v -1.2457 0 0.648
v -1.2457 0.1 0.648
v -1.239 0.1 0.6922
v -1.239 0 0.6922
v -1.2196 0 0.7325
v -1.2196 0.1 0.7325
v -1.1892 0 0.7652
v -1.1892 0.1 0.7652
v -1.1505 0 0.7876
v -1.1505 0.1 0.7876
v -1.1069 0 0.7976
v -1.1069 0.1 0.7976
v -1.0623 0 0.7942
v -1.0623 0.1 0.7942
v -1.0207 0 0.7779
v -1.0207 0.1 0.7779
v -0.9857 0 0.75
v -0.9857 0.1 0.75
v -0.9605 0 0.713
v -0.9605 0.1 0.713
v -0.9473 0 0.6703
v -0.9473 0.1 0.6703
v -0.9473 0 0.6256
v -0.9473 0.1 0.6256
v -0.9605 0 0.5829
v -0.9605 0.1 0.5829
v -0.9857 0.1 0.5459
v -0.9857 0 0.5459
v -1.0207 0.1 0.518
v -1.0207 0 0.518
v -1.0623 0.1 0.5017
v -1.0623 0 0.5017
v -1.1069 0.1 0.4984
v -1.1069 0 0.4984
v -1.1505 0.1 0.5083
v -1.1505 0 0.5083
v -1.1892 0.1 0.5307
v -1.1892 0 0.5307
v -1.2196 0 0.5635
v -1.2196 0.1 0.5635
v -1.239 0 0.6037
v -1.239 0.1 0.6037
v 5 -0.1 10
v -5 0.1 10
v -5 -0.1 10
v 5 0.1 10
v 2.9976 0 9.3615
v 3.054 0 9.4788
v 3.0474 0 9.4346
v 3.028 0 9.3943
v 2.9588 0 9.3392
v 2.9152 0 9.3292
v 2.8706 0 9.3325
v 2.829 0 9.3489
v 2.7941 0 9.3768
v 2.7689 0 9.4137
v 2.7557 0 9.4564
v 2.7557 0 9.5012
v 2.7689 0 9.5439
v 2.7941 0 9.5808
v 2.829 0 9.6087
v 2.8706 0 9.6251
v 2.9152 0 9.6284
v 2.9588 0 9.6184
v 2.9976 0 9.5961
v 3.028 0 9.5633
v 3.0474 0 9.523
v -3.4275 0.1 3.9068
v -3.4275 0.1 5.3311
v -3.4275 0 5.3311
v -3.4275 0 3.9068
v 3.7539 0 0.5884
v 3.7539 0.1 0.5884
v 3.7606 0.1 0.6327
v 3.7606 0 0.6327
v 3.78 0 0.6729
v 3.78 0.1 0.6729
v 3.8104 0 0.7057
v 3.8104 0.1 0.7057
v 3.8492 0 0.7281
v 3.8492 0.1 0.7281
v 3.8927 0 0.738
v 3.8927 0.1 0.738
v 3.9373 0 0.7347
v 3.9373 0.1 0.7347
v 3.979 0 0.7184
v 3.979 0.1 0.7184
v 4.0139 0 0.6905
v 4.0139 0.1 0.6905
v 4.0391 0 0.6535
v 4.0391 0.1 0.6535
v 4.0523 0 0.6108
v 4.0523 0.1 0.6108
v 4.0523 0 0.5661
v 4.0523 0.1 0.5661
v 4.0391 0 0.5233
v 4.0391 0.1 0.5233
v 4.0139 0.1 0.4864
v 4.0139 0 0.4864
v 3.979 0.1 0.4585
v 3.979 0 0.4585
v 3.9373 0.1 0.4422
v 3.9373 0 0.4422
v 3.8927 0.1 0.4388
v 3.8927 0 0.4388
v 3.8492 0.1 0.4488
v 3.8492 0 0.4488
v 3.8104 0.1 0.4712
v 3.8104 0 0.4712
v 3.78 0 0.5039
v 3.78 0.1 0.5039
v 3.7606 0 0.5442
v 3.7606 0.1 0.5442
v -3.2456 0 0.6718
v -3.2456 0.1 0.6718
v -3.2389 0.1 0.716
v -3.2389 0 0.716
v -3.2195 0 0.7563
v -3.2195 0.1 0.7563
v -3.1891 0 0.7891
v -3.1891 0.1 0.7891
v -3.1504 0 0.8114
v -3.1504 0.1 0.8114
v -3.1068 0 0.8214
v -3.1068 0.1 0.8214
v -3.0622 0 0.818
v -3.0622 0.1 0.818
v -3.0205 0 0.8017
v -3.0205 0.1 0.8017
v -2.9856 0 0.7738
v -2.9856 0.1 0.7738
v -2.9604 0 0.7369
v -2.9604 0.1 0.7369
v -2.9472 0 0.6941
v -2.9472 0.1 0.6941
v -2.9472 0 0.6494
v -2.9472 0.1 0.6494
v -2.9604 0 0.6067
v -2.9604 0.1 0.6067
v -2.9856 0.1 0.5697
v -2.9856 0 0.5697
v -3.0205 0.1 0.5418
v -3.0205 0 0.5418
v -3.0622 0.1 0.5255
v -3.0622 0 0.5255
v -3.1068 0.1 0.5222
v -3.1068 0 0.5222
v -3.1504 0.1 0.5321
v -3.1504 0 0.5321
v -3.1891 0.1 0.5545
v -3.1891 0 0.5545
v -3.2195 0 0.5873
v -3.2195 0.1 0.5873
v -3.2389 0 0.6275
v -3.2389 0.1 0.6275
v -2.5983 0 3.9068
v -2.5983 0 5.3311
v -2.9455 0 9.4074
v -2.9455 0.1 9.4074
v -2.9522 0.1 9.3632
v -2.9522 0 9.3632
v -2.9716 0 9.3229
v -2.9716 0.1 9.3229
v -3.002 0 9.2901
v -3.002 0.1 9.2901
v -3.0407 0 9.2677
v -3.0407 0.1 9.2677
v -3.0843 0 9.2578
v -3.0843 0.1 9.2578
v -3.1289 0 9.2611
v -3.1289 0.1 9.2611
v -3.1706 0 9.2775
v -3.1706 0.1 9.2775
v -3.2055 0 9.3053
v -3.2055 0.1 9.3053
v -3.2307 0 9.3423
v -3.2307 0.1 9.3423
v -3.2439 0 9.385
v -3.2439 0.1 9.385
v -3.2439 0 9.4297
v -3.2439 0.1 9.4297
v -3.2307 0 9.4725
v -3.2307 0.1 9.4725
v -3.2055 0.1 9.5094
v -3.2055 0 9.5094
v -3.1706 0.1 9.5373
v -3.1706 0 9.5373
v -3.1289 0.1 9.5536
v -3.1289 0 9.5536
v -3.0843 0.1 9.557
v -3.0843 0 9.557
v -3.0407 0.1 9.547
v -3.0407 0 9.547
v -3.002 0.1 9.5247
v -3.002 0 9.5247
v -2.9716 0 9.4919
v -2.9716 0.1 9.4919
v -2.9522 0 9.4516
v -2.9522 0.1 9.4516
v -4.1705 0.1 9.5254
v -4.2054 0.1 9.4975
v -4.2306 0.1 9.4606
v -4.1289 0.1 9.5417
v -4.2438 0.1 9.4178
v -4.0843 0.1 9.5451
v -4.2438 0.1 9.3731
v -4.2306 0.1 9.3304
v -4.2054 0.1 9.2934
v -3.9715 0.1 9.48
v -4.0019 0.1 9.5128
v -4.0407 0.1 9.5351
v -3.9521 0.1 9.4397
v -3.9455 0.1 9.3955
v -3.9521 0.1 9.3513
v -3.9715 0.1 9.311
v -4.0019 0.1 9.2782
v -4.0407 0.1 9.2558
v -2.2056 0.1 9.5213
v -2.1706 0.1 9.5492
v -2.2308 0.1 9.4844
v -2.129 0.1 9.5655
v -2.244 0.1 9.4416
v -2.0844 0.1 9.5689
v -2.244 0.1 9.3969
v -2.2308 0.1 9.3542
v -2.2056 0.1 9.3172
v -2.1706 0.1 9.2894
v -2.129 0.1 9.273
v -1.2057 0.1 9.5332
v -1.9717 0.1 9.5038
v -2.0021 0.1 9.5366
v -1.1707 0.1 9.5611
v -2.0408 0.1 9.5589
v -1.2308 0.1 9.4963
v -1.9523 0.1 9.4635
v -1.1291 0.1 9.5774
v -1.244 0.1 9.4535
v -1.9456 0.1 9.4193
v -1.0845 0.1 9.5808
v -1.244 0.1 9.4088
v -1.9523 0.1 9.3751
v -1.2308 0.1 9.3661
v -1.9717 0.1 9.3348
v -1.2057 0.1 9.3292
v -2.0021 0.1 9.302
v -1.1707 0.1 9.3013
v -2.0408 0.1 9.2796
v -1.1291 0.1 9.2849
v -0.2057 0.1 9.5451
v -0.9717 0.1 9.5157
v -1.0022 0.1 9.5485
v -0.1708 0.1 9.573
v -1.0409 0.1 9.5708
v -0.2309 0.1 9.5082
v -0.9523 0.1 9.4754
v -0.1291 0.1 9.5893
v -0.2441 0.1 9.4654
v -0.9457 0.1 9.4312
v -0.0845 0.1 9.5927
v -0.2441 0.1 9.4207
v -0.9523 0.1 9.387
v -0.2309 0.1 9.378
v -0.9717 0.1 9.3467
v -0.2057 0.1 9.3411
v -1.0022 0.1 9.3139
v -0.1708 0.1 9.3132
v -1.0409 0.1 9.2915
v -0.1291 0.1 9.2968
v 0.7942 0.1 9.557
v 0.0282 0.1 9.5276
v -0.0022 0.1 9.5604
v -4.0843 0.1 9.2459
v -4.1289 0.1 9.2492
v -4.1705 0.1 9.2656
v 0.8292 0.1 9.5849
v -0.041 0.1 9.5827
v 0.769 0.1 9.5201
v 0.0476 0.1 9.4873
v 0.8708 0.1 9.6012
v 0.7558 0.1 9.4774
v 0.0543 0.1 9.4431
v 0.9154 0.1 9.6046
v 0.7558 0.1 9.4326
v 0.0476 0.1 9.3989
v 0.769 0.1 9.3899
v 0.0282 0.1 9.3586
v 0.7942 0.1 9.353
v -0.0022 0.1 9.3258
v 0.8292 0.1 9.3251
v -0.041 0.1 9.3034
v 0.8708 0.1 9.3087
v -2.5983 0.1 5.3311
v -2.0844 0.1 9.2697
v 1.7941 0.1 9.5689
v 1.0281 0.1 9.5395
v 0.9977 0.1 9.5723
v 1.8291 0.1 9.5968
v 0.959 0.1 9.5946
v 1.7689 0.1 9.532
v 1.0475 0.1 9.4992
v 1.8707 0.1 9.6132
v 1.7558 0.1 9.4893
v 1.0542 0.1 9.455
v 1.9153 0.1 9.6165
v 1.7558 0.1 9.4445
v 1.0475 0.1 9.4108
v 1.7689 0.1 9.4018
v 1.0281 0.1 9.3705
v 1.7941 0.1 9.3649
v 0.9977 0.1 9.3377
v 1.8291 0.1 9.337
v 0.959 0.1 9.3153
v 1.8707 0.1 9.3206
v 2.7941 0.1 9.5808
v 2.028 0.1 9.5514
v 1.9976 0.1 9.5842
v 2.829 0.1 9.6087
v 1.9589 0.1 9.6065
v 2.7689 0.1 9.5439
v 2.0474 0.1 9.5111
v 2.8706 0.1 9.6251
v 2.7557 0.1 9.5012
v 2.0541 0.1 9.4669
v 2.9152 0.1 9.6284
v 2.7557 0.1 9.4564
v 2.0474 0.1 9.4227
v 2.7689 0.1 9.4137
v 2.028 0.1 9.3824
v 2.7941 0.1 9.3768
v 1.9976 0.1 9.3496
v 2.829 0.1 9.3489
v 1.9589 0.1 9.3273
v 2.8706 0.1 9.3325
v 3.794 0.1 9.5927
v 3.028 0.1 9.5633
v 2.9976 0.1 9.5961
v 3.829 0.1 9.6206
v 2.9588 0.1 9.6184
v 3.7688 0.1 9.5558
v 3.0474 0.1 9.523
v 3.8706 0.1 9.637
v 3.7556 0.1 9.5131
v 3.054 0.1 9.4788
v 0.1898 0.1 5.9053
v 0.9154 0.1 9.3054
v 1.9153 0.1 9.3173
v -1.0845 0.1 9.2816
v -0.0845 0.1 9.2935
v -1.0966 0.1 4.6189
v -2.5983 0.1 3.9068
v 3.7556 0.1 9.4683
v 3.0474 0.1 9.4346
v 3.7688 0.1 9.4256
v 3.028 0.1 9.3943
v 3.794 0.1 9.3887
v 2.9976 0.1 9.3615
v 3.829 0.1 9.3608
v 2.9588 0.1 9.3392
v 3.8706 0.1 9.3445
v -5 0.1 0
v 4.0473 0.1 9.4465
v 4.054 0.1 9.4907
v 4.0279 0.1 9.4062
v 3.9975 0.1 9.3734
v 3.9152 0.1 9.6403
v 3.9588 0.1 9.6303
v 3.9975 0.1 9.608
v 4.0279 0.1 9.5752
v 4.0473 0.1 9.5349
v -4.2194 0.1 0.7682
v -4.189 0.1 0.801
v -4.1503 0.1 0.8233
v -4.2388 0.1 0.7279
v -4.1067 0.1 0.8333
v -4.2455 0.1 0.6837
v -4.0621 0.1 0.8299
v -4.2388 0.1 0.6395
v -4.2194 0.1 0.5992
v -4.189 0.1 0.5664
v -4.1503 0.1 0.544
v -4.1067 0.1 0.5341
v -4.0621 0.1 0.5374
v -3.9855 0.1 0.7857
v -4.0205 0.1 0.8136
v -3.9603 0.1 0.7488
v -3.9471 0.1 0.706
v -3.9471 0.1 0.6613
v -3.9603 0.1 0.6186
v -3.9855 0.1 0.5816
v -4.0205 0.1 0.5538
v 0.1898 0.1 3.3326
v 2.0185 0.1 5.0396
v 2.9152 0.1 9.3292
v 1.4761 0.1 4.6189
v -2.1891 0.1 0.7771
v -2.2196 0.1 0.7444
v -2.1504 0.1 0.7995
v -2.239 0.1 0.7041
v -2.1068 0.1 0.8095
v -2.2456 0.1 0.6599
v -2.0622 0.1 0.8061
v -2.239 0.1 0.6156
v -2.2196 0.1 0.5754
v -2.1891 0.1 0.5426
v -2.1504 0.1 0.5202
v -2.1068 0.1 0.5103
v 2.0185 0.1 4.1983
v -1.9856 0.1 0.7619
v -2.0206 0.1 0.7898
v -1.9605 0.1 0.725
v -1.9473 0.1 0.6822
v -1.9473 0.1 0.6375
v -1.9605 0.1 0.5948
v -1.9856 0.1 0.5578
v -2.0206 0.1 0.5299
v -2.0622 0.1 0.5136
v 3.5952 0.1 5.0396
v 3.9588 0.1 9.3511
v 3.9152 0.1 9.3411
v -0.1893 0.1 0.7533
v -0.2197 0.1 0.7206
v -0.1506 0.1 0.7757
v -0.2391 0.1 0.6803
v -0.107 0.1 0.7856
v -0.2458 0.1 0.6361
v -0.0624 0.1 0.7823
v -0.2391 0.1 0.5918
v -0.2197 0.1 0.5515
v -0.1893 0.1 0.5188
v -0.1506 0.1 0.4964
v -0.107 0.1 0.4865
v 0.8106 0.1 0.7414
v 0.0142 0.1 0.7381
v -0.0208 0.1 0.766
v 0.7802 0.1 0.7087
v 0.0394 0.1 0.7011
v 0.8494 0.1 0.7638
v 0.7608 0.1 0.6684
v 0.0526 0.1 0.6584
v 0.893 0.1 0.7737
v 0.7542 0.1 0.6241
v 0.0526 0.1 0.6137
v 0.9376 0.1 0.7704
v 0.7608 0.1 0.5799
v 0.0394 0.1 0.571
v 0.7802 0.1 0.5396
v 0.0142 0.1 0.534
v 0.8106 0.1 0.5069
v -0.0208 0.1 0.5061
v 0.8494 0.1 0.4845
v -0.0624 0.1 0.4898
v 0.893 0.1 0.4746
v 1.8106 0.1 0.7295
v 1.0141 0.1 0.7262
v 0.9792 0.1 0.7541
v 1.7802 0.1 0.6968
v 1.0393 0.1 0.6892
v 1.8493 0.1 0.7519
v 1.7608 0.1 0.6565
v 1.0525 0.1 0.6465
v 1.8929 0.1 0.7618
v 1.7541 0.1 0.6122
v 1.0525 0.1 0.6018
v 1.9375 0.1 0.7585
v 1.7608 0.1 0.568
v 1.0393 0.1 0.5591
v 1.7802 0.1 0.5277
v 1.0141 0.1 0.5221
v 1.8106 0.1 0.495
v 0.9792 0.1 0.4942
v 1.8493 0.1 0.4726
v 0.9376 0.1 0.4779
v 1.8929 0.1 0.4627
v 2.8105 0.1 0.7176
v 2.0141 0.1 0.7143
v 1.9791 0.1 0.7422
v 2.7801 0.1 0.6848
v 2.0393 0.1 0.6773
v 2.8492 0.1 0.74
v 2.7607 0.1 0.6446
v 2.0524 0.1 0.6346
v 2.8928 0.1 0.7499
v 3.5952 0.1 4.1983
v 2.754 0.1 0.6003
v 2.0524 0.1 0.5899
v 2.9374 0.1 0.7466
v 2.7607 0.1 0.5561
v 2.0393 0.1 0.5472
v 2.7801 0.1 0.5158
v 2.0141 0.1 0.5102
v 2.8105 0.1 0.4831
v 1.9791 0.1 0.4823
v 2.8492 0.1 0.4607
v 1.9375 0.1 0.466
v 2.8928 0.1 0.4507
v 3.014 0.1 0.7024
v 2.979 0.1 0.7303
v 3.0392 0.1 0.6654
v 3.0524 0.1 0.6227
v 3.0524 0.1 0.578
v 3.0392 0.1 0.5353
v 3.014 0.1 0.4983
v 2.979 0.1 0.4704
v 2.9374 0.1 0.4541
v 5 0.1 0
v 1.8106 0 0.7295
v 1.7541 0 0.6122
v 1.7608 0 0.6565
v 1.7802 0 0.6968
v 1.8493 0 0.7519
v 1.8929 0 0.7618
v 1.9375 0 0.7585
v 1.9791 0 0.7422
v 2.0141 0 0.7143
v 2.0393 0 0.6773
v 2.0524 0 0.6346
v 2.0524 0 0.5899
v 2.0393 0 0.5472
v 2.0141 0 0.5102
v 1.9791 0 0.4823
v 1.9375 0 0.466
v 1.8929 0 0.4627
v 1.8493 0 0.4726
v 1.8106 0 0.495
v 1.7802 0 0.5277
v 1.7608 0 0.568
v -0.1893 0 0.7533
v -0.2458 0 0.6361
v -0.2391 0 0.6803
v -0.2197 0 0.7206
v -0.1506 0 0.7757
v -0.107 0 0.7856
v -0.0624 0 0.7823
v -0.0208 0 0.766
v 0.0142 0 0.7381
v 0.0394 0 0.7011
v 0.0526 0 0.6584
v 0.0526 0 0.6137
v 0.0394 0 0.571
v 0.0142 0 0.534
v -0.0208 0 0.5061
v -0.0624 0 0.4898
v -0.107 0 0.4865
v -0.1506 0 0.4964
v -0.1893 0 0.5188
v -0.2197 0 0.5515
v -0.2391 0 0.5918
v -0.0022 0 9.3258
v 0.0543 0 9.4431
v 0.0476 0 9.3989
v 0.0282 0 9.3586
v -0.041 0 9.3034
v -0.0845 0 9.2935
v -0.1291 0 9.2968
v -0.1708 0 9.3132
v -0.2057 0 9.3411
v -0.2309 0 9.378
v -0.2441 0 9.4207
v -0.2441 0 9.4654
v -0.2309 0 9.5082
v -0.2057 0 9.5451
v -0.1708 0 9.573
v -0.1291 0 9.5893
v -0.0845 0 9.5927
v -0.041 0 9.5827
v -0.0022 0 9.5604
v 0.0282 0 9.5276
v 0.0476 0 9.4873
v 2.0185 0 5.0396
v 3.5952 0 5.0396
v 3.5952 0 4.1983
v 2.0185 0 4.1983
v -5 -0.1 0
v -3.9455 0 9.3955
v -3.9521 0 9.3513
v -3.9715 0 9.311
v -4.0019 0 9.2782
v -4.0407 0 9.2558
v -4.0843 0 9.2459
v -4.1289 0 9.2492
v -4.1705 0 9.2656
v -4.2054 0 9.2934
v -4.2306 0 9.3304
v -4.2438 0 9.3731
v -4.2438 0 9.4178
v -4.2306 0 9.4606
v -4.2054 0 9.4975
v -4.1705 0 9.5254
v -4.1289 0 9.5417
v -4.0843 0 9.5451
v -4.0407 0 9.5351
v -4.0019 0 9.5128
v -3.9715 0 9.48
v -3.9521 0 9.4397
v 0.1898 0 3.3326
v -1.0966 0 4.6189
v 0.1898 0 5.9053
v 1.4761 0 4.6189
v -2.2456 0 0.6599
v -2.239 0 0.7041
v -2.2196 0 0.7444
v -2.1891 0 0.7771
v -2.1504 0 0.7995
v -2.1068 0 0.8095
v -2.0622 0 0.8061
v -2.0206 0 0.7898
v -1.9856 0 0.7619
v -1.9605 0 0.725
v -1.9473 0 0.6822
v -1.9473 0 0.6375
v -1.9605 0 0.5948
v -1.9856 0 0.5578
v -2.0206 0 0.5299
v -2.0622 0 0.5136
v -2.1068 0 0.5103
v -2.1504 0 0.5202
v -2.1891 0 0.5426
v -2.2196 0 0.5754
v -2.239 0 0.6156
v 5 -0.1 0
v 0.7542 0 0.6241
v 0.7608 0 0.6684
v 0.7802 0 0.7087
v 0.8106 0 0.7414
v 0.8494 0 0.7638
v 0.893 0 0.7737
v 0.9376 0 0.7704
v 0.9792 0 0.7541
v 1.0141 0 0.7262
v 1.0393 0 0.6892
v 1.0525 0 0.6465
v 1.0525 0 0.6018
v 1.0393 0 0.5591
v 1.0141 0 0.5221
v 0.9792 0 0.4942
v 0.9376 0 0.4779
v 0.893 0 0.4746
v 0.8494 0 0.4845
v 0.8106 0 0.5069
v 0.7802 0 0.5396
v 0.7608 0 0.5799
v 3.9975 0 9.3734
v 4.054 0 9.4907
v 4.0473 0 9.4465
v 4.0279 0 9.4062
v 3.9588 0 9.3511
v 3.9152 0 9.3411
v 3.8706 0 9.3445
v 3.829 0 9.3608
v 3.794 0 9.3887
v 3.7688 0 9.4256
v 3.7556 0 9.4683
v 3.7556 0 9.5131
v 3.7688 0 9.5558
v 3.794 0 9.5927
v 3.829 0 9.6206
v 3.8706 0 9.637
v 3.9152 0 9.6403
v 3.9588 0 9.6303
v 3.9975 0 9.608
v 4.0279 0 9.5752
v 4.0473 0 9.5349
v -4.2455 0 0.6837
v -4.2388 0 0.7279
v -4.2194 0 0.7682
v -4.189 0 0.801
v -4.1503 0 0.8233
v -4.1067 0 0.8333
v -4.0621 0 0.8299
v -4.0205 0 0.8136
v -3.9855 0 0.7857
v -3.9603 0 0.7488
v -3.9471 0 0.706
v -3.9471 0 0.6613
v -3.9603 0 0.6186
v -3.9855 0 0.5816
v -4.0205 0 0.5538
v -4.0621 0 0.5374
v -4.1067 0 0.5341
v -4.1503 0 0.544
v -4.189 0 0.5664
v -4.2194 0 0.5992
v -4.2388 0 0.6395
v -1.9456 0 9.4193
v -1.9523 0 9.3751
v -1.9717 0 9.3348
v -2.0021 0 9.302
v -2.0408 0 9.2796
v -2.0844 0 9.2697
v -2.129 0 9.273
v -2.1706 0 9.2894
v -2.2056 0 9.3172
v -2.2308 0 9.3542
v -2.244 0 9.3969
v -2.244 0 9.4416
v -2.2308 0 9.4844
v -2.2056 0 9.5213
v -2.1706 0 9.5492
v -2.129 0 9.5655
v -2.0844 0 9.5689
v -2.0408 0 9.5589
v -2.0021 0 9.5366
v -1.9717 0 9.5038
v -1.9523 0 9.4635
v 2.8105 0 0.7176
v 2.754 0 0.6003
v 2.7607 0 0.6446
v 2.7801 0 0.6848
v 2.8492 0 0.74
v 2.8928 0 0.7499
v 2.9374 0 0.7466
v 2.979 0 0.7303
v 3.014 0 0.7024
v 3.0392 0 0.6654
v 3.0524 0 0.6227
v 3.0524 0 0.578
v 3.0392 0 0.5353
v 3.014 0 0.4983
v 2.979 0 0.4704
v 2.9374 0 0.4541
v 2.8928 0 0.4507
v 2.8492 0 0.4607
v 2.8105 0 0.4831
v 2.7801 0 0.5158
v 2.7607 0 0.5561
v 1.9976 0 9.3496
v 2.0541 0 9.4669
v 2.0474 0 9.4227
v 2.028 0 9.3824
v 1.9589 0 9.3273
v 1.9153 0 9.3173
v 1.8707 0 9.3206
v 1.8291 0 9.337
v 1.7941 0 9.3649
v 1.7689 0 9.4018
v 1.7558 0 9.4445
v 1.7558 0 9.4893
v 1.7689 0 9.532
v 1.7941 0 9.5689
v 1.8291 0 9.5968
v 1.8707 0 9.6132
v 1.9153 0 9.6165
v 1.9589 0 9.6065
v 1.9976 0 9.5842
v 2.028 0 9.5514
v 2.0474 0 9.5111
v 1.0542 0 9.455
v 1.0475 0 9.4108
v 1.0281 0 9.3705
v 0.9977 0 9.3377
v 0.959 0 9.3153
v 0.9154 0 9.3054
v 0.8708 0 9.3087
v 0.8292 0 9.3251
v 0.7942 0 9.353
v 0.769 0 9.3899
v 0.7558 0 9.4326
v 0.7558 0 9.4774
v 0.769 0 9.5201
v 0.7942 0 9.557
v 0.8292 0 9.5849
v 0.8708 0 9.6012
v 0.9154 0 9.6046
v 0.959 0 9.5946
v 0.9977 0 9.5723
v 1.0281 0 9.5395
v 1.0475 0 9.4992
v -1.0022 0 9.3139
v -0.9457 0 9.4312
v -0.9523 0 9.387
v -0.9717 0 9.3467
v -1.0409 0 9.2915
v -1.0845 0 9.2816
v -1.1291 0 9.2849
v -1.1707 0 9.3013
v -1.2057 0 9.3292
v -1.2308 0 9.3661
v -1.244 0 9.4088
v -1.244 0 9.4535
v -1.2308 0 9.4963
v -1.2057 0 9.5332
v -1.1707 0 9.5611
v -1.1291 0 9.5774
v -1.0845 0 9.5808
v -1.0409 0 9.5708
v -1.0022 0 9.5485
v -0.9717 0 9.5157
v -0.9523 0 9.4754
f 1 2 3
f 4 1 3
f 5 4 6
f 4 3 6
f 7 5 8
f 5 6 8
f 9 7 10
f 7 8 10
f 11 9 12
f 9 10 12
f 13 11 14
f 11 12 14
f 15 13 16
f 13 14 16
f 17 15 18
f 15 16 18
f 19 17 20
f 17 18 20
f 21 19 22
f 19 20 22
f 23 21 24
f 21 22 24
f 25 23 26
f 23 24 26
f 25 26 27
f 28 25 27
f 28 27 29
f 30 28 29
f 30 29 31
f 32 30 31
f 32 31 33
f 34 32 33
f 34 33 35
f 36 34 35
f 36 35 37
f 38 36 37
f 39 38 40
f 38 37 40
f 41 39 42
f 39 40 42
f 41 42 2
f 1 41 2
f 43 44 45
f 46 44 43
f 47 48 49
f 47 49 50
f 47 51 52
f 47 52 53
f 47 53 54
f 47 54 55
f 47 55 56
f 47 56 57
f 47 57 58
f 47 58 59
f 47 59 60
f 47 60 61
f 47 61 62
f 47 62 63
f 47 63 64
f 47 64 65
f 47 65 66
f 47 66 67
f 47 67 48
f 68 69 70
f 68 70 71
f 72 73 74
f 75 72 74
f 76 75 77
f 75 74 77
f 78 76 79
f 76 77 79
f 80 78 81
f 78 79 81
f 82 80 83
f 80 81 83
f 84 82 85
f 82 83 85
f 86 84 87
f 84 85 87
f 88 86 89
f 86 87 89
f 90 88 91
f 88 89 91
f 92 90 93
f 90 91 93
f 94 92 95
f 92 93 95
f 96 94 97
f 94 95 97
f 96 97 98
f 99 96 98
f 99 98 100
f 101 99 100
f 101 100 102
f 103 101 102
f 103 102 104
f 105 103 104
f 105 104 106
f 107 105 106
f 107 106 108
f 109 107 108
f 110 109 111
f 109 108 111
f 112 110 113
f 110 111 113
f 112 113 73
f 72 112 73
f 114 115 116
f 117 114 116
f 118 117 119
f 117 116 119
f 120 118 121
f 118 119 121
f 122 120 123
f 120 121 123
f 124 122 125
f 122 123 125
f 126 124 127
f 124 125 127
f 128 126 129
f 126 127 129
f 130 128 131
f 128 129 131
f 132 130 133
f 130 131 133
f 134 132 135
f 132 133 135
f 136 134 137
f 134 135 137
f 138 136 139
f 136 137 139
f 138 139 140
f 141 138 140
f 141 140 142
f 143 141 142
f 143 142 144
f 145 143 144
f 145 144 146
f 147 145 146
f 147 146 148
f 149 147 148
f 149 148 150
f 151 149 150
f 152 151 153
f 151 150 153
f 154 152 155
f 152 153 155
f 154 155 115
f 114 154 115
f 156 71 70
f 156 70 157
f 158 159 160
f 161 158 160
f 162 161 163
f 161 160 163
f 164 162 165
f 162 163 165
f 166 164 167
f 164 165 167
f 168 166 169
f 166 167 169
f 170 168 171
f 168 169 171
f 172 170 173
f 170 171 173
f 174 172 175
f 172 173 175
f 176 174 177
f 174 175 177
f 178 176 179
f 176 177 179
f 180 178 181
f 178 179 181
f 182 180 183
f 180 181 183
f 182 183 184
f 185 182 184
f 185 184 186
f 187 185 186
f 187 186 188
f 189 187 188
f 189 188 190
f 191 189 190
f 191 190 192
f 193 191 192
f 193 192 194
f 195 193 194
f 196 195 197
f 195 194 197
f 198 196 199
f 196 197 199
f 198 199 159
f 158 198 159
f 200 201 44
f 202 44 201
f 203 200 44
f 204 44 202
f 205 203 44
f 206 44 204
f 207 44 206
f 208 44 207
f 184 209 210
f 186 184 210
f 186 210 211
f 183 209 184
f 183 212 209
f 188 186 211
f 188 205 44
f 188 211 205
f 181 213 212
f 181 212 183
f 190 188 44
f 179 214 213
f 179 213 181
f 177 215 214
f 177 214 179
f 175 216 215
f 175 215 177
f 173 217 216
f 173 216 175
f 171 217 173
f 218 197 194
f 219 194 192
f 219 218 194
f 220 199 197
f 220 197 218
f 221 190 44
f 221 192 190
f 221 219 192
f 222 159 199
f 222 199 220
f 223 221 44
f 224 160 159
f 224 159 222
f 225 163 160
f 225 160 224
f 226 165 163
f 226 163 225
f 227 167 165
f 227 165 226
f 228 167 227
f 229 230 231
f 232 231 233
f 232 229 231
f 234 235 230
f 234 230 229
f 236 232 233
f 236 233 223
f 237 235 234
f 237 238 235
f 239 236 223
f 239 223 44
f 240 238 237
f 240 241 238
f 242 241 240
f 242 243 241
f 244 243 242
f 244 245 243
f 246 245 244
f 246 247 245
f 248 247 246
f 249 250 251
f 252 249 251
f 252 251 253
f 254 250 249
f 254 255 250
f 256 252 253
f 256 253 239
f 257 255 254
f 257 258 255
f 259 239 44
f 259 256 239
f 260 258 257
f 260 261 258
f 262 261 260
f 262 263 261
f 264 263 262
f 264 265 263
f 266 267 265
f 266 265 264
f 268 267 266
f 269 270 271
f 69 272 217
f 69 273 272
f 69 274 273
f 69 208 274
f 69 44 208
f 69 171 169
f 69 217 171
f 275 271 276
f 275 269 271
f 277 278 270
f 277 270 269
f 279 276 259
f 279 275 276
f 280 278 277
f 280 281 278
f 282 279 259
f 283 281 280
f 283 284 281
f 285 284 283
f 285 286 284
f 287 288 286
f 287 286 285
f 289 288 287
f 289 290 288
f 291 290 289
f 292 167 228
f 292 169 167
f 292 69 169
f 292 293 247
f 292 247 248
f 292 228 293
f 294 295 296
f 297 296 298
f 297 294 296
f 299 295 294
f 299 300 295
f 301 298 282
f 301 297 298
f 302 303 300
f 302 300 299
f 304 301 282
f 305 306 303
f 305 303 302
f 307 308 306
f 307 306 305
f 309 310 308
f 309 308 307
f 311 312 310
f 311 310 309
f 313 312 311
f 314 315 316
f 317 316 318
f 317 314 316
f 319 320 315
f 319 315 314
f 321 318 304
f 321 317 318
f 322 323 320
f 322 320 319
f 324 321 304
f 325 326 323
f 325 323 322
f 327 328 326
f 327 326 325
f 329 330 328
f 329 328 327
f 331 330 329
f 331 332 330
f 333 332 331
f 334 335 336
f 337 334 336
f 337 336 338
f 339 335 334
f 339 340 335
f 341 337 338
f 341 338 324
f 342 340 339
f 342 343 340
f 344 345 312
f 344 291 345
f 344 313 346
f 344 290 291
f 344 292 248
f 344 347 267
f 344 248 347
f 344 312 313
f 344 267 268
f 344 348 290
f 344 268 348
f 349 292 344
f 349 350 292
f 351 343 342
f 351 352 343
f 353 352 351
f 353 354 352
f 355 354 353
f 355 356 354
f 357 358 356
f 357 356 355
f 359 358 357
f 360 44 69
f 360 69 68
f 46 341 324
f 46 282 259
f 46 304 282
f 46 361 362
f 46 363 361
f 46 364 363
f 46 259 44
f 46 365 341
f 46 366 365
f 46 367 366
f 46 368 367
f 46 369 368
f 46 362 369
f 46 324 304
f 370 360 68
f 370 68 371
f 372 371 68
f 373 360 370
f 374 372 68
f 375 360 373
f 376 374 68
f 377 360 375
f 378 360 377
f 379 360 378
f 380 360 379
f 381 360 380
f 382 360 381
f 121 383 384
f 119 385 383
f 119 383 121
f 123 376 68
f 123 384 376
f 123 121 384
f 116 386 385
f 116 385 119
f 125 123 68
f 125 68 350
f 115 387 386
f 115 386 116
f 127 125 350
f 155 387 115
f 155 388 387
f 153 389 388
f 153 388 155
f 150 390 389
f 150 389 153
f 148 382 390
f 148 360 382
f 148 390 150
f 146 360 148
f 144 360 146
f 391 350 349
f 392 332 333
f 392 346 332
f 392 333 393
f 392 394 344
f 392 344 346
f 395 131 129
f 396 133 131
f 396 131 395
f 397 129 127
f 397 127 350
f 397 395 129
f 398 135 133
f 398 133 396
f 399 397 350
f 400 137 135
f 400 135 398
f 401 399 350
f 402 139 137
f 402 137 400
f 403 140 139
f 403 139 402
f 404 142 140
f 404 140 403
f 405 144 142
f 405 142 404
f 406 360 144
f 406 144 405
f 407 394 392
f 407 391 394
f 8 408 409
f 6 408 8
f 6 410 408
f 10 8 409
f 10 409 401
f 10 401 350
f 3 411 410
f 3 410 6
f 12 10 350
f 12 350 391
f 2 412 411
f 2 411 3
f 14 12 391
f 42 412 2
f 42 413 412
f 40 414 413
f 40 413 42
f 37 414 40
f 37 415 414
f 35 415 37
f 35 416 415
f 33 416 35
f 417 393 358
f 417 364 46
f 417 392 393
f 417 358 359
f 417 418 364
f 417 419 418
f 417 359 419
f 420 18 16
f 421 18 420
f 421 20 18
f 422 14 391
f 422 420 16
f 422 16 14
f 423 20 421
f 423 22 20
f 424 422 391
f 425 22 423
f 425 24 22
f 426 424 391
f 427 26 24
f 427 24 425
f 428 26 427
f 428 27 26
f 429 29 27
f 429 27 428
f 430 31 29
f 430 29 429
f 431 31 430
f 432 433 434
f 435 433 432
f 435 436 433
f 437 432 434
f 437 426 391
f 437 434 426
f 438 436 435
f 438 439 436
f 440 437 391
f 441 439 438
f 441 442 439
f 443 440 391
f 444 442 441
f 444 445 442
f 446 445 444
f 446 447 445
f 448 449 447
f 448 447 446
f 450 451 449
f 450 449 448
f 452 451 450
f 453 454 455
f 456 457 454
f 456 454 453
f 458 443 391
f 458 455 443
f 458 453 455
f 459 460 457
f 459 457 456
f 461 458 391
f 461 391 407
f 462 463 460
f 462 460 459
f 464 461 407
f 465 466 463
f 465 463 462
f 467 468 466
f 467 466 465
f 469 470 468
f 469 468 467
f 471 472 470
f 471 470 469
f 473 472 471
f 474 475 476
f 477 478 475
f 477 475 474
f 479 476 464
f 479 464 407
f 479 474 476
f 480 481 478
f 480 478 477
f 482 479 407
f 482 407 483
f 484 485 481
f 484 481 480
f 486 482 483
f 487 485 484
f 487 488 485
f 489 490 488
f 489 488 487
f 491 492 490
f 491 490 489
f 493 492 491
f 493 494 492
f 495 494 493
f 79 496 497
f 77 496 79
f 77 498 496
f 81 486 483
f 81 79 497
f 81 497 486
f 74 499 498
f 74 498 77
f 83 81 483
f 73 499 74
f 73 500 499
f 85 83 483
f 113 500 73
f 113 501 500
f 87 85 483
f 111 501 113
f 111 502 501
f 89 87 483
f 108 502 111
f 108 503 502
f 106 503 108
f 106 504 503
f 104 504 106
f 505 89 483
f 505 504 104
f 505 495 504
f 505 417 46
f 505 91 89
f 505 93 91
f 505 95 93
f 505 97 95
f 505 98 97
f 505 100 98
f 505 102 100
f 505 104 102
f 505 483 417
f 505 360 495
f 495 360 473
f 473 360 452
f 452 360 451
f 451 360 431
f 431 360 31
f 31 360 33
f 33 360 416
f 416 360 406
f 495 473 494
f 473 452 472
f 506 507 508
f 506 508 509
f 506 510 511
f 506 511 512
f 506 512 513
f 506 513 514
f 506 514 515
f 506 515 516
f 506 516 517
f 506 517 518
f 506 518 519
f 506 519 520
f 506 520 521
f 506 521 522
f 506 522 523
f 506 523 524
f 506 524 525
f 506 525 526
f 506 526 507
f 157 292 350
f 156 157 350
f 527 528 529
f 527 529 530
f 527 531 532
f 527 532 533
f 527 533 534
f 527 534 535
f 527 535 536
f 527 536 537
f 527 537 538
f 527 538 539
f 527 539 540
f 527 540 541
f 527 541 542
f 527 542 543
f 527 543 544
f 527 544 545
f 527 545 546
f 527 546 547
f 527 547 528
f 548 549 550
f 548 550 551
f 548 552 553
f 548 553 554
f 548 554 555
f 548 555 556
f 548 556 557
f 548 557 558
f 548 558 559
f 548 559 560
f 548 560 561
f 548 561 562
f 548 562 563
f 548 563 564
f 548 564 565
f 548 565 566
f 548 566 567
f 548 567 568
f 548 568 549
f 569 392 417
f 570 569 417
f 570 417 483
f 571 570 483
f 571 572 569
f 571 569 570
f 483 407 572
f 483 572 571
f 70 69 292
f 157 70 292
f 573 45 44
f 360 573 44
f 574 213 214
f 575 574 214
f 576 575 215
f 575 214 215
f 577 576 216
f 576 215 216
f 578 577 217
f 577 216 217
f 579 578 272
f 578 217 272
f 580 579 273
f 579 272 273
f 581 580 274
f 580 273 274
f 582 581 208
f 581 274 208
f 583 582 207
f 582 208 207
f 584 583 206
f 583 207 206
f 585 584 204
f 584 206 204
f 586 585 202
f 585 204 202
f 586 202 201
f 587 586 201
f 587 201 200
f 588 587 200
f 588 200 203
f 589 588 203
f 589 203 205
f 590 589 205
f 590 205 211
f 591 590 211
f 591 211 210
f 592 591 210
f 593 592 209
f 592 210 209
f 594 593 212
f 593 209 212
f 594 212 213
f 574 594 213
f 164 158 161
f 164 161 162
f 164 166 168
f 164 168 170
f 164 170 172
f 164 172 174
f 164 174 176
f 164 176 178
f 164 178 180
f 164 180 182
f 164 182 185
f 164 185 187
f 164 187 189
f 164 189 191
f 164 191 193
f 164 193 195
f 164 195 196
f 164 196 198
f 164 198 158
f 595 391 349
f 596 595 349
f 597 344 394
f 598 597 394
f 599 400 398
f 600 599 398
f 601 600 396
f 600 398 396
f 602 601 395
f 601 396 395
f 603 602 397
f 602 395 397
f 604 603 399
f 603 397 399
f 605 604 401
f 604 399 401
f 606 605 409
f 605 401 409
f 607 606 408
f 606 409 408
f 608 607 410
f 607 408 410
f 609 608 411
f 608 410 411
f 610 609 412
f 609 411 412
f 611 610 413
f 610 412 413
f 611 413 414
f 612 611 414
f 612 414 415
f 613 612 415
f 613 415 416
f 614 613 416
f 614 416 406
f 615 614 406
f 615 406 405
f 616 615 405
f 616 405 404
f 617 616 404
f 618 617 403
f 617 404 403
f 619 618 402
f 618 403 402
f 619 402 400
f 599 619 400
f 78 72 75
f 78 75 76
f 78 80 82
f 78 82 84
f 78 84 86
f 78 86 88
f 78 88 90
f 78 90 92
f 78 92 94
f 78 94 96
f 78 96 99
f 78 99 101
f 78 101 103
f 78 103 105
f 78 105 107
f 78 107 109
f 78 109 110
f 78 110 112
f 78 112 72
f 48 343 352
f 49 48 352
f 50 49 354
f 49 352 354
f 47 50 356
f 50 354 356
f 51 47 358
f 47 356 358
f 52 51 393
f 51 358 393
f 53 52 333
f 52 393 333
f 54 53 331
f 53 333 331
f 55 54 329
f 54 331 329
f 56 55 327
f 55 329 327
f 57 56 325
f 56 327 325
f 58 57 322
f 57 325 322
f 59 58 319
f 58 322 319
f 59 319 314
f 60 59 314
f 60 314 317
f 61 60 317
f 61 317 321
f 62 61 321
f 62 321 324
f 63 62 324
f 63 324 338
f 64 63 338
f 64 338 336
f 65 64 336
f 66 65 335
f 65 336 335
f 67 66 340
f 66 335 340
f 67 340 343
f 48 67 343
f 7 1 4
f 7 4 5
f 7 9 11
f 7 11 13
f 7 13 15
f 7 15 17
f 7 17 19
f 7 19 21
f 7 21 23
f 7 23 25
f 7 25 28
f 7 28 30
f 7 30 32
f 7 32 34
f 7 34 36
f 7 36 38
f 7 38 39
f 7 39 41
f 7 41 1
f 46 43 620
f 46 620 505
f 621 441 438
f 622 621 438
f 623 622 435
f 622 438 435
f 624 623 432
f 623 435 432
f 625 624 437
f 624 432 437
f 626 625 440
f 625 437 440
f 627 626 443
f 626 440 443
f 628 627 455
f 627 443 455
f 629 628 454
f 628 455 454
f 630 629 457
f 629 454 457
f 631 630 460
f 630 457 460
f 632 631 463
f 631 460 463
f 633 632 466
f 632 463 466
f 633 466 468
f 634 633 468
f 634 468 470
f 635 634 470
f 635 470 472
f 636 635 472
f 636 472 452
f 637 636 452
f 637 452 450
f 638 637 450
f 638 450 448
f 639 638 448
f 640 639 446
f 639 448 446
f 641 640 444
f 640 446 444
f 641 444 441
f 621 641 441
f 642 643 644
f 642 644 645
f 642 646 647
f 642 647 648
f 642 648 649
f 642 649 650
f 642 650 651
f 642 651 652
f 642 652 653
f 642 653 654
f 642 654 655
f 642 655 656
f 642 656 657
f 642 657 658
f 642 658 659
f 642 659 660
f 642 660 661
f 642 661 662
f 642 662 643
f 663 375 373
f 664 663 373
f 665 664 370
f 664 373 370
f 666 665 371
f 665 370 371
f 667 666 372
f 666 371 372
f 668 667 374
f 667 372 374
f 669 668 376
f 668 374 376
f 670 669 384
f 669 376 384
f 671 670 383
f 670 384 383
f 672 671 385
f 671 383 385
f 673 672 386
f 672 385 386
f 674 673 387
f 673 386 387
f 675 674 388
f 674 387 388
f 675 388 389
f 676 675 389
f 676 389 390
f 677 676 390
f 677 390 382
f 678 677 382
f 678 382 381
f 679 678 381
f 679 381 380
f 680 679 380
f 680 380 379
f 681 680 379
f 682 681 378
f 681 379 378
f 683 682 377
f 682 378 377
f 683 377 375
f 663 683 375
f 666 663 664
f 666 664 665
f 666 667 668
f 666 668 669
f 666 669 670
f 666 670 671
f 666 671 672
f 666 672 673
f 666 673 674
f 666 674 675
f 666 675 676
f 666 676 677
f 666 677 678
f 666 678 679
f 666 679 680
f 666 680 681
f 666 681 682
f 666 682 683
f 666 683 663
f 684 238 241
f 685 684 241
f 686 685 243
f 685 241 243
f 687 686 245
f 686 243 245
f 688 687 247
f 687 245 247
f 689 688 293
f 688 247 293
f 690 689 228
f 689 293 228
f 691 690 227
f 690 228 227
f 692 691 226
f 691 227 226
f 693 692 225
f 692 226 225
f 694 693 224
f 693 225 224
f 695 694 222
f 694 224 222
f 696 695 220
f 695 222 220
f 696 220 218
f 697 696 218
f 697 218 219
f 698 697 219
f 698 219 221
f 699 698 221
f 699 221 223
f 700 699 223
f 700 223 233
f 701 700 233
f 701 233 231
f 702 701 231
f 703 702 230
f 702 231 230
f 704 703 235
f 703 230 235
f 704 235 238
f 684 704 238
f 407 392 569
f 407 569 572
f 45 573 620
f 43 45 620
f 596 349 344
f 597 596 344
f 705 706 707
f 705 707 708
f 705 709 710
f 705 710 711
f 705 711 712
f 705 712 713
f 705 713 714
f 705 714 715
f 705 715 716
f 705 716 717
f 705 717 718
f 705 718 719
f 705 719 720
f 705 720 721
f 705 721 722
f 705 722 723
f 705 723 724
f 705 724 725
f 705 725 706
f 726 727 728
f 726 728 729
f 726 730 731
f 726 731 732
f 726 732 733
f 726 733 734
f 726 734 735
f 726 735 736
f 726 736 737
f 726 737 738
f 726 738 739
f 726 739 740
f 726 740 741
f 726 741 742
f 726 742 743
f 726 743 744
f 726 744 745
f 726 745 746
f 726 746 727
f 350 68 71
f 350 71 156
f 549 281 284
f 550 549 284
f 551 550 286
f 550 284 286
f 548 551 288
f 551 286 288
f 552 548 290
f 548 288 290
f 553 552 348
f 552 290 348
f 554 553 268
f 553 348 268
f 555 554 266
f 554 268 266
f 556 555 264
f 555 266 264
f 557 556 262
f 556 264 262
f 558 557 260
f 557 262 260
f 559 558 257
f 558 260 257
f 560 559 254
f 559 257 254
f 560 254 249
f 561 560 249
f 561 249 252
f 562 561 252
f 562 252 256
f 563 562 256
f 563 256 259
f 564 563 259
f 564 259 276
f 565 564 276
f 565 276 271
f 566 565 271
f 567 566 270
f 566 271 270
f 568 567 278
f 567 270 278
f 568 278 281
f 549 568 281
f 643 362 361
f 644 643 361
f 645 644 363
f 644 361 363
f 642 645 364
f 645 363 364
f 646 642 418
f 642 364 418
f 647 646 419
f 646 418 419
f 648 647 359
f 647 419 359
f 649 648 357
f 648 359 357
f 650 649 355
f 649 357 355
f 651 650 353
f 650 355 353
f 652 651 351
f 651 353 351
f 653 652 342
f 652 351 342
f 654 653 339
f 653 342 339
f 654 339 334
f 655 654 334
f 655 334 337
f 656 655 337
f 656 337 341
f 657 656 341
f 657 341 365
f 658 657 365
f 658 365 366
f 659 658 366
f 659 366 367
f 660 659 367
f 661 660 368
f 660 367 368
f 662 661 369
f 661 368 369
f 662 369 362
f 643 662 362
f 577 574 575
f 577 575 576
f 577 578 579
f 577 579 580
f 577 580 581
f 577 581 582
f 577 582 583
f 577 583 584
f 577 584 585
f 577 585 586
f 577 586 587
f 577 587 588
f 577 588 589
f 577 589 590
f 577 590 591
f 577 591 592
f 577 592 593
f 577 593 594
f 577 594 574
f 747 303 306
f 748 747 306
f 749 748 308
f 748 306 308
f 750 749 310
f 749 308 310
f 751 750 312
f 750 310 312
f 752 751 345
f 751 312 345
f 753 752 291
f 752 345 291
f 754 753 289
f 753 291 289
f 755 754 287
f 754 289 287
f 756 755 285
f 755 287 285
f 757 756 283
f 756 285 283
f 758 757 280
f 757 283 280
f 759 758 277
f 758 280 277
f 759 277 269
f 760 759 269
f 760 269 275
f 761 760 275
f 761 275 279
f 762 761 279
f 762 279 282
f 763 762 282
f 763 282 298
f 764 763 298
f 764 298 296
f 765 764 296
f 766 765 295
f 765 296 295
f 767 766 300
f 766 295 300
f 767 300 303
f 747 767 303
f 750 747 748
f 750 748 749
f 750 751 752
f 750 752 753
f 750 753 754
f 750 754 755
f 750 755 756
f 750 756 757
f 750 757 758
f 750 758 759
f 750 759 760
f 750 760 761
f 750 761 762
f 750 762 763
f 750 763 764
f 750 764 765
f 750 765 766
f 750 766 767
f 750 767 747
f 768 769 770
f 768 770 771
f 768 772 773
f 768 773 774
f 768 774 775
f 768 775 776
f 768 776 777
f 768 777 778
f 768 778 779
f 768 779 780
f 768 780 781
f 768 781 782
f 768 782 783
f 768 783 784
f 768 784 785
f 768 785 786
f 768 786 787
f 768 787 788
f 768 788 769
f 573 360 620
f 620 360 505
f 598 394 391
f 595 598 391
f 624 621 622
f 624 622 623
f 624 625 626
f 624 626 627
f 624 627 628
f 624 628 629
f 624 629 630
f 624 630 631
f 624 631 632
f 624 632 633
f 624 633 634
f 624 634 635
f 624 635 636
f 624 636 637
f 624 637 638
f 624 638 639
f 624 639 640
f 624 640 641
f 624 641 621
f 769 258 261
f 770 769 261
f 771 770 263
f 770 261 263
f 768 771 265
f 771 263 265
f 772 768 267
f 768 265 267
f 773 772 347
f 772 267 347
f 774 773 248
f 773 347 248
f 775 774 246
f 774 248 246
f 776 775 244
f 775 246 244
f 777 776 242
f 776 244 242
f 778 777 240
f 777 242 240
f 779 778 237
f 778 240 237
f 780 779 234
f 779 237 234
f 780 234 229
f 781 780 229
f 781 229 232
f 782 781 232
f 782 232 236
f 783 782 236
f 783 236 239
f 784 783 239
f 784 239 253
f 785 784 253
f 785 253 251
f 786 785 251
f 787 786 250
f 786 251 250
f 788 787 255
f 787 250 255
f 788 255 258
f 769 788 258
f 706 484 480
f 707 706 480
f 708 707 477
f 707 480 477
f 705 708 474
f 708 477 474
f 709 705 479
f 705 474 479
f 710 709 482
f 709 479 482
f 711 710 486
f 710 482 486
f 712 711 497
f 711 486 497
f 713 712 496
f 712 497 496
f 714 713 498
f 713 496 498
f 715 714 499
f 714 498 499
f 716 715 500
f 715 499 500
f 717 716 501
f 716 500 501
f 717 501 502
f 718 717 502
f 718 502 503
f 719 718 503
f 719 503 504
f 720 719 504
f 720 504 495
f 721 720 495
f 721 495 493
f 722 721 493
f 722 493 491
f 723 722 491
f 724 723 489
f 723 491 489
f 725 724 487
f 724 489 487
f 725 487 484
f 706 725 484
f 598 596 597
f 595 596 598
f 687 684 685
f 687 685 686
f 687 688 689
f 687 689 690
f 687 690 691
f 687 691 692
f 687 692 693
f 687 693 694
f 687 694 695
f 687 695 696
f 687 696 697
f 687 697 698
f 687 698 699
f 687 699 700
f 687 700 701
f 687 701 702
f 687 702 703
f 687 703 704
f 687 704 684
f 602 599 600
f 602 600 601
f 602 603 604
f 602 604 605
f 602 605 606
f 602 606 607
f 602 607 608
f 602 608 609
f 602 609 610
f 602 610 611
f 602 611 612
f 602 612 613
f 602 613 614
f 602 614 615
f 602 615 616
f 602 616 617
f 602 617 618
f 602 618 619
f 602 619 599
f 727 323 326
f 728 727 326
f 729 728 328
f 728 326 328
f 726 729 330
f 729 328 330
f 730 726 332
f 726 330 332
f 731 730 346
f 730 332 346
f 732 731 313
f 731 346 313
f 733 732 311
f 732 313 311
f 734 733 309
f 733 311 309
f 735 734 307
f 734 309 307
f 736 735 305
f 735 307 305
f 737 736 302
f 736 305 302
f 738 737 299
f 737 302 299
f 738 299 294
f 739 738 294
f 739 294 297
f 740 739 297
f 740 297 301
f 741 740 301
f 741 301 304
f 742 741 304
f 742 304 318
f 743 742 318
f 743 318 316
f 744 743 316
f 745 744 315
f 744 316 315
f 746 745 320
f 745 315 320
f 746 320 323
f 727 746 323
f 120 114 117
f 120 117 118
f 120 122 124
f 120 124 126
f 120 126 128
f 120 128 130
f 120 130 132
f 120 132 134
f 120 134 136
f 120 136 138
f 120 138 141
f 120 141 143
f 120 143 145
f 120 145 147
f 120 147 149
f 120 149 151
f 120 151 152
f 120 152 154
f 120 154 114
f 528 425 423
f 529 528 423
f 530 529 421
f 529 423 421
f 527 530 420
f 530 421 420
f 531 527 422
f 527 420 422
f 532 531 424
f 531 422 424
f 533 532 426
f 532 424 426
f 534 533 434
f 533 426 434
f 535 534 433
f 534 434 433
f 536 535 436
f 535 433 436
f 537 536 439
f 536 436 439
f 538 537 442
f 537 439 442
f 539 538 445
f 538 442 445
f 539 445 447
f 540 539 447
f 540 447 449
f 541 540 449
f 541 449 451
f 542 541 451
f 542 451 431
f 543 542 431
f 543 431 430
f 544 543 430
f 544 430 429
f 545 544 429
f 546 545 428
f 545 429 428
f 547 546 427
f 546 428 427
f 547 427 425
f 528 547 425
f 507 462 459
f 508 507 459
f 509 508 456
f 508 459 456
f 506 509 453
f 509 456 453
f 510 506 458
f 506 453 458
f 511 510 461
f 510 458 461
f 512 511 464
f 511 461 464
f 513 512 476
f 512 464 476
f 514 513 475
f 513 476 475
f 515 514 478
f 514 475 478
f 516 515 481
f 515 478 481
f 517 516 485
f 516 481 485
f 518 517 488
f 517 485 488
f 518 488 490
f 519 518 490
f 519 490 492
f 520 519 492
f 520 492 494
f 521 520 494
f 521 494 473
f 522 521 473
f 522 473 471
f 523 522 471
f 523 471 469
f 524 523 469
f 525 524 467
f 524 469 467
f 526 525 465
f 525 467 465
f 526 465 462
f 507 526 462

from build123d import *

# Parameters (mm, degrees)
SKETCH1_W           = 10
SKETCH1_H           = 0.2
BOSS_EXTRUDE1_DEPTH = 10
SKETCH2_R           = 0.150013962
SKETCH2_W           = 0.829232584
SKETCH2_H           = 1.424301619
SKETCH2_W_2         = 1.576755533
SKETCH2_H_2         = 0.841304981
CUT_EXTRUDE1_DEPTH  = 0.1


with BuildPart() as part:
    # Sketch1 → Boss-Extrude1 (new body)
    with BuildSketch(Plane.XY):
        Rectangle(SKETCH1_W, SKETCH1_H)
    extrude(amount=BOSS_EXTRUDE1_DEPTH)

    # Sketch2 → Cut-Extrude1 (cut)
    with BuildSketch(Plane(origin=(0, 0.1, 0), x_dir=(1, 0, 0), z_dir=(0, 1, 0))):
        with Locations(Location((3.903958112, -0.58843737, 0), (0, 0, 180))):
            Circle(SKETCH2_R)
        with Locations(Location((2.904028968, -0.600341426, 0), (0, 0, 180))):
            Circle(SKETCH2_R)
        with Locations(Location((1.904099824, -0.612245481, 0), (0, 0, 180))):
            Circle(SKETCH2_R)
        with Locations(Location((0.904170679, -0.624149537, 0), (0, 0, 180))):
            Circle(SKETCH2_R)
        with Locations(Location((-0.095758465, -0.636053593, 0), (0, 0, 180))):
            Circle(SKETCH2_R)
        with Locations(Location((-1.095687609, -0.647957649, 0), (0, 0, 180))):
            Circle(SKETCH2_R)
        with Locations(Location((-2.095616753, -0.659861704, 0), (0, 0, 180))):
            Circle(SKETCH2_R)
        with Locations(Location((-3.095545897, -0.67176576, 0), (0, 0, 180))):
            Circle(SKETCH2_R)
        with Locations(Location((-4.095475042, -0.683669816, 0), (0, 0, 180))):
            Circle(SKETCH2_R)
        with Locations((-4.095475042, -9.395473292)):
            Circle(SKETCH2_R)
        with Locations((-3.095545897, -9.407377347)):
            Circle(SKETCH2_R)
        with Locations((-2.095616753, -9.419281403)):
            Circle(SKETCH2_R)
        with Locations((-1.095687609, -9.431185459)):
            Circle(SKETCH2_R)
        with Locations((0.904170679, -9.45499357)):
            Circle(SKETCH2_R)
        with Locations((-0.095758465, -9.443089515)):
            Circle(SKETCH2_R)
        with Locations((1.904099824, -9.466897626)):
            Circle(SKETCH2_R)
        with Locations((2.904028968, -9.478801682)):
            Circle(SKETCH2_R)
        with Locations((3.903958112, -9.490705738)):
            Circle(SKETCH2_R)
        Polygon((1.476108968, -4.618919063), (0.189761323, -3.332571418), (-1.096586323, -4.618919063), (0.189761323, -5.905266709), align=None)
        with Locations((-3.012916665, -4.618919063)):
            Rectangle(SKETCH2_W, SKETCH2_H)
        with Locations((2.806863526, -4.618919063)):
            Rectangle(SKETCH2_W_2, SKETCH2_H_2)
    extrude(amount=-CUT_EXTRUDE1_DEPTH, mode=Mode.SUBTRACT)


solid = part.part
